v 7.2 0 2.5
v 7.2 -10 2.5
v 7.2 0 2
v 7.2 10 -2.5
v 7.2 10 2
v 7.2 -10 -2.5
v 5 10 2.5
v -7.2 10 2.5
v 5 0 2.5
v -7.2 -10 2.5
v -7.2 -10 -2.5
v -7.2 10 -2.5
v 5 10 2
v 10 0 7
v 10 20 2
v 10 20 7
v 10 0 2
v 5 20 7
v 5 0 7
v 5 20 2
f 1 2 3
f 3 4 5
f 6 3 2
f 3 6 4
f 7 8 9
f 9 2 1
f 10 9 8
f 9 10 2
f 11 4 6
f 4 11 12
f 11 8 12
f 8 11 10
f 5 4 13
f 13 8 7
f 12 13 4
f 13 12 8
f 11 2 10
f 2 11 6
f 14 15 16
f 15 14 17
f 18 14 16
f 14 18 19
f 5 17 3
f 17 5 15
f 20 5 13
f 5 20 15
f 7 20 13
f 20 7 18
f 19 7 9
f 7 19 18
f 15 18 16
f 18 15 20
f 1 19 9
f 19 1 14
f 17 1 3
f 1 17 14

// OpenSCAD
scale([1.2,1,1])
    cube([12,20,5],center=true);
translate([5,0,10 - 8])
    cube([5,20,5],center=false);
    
